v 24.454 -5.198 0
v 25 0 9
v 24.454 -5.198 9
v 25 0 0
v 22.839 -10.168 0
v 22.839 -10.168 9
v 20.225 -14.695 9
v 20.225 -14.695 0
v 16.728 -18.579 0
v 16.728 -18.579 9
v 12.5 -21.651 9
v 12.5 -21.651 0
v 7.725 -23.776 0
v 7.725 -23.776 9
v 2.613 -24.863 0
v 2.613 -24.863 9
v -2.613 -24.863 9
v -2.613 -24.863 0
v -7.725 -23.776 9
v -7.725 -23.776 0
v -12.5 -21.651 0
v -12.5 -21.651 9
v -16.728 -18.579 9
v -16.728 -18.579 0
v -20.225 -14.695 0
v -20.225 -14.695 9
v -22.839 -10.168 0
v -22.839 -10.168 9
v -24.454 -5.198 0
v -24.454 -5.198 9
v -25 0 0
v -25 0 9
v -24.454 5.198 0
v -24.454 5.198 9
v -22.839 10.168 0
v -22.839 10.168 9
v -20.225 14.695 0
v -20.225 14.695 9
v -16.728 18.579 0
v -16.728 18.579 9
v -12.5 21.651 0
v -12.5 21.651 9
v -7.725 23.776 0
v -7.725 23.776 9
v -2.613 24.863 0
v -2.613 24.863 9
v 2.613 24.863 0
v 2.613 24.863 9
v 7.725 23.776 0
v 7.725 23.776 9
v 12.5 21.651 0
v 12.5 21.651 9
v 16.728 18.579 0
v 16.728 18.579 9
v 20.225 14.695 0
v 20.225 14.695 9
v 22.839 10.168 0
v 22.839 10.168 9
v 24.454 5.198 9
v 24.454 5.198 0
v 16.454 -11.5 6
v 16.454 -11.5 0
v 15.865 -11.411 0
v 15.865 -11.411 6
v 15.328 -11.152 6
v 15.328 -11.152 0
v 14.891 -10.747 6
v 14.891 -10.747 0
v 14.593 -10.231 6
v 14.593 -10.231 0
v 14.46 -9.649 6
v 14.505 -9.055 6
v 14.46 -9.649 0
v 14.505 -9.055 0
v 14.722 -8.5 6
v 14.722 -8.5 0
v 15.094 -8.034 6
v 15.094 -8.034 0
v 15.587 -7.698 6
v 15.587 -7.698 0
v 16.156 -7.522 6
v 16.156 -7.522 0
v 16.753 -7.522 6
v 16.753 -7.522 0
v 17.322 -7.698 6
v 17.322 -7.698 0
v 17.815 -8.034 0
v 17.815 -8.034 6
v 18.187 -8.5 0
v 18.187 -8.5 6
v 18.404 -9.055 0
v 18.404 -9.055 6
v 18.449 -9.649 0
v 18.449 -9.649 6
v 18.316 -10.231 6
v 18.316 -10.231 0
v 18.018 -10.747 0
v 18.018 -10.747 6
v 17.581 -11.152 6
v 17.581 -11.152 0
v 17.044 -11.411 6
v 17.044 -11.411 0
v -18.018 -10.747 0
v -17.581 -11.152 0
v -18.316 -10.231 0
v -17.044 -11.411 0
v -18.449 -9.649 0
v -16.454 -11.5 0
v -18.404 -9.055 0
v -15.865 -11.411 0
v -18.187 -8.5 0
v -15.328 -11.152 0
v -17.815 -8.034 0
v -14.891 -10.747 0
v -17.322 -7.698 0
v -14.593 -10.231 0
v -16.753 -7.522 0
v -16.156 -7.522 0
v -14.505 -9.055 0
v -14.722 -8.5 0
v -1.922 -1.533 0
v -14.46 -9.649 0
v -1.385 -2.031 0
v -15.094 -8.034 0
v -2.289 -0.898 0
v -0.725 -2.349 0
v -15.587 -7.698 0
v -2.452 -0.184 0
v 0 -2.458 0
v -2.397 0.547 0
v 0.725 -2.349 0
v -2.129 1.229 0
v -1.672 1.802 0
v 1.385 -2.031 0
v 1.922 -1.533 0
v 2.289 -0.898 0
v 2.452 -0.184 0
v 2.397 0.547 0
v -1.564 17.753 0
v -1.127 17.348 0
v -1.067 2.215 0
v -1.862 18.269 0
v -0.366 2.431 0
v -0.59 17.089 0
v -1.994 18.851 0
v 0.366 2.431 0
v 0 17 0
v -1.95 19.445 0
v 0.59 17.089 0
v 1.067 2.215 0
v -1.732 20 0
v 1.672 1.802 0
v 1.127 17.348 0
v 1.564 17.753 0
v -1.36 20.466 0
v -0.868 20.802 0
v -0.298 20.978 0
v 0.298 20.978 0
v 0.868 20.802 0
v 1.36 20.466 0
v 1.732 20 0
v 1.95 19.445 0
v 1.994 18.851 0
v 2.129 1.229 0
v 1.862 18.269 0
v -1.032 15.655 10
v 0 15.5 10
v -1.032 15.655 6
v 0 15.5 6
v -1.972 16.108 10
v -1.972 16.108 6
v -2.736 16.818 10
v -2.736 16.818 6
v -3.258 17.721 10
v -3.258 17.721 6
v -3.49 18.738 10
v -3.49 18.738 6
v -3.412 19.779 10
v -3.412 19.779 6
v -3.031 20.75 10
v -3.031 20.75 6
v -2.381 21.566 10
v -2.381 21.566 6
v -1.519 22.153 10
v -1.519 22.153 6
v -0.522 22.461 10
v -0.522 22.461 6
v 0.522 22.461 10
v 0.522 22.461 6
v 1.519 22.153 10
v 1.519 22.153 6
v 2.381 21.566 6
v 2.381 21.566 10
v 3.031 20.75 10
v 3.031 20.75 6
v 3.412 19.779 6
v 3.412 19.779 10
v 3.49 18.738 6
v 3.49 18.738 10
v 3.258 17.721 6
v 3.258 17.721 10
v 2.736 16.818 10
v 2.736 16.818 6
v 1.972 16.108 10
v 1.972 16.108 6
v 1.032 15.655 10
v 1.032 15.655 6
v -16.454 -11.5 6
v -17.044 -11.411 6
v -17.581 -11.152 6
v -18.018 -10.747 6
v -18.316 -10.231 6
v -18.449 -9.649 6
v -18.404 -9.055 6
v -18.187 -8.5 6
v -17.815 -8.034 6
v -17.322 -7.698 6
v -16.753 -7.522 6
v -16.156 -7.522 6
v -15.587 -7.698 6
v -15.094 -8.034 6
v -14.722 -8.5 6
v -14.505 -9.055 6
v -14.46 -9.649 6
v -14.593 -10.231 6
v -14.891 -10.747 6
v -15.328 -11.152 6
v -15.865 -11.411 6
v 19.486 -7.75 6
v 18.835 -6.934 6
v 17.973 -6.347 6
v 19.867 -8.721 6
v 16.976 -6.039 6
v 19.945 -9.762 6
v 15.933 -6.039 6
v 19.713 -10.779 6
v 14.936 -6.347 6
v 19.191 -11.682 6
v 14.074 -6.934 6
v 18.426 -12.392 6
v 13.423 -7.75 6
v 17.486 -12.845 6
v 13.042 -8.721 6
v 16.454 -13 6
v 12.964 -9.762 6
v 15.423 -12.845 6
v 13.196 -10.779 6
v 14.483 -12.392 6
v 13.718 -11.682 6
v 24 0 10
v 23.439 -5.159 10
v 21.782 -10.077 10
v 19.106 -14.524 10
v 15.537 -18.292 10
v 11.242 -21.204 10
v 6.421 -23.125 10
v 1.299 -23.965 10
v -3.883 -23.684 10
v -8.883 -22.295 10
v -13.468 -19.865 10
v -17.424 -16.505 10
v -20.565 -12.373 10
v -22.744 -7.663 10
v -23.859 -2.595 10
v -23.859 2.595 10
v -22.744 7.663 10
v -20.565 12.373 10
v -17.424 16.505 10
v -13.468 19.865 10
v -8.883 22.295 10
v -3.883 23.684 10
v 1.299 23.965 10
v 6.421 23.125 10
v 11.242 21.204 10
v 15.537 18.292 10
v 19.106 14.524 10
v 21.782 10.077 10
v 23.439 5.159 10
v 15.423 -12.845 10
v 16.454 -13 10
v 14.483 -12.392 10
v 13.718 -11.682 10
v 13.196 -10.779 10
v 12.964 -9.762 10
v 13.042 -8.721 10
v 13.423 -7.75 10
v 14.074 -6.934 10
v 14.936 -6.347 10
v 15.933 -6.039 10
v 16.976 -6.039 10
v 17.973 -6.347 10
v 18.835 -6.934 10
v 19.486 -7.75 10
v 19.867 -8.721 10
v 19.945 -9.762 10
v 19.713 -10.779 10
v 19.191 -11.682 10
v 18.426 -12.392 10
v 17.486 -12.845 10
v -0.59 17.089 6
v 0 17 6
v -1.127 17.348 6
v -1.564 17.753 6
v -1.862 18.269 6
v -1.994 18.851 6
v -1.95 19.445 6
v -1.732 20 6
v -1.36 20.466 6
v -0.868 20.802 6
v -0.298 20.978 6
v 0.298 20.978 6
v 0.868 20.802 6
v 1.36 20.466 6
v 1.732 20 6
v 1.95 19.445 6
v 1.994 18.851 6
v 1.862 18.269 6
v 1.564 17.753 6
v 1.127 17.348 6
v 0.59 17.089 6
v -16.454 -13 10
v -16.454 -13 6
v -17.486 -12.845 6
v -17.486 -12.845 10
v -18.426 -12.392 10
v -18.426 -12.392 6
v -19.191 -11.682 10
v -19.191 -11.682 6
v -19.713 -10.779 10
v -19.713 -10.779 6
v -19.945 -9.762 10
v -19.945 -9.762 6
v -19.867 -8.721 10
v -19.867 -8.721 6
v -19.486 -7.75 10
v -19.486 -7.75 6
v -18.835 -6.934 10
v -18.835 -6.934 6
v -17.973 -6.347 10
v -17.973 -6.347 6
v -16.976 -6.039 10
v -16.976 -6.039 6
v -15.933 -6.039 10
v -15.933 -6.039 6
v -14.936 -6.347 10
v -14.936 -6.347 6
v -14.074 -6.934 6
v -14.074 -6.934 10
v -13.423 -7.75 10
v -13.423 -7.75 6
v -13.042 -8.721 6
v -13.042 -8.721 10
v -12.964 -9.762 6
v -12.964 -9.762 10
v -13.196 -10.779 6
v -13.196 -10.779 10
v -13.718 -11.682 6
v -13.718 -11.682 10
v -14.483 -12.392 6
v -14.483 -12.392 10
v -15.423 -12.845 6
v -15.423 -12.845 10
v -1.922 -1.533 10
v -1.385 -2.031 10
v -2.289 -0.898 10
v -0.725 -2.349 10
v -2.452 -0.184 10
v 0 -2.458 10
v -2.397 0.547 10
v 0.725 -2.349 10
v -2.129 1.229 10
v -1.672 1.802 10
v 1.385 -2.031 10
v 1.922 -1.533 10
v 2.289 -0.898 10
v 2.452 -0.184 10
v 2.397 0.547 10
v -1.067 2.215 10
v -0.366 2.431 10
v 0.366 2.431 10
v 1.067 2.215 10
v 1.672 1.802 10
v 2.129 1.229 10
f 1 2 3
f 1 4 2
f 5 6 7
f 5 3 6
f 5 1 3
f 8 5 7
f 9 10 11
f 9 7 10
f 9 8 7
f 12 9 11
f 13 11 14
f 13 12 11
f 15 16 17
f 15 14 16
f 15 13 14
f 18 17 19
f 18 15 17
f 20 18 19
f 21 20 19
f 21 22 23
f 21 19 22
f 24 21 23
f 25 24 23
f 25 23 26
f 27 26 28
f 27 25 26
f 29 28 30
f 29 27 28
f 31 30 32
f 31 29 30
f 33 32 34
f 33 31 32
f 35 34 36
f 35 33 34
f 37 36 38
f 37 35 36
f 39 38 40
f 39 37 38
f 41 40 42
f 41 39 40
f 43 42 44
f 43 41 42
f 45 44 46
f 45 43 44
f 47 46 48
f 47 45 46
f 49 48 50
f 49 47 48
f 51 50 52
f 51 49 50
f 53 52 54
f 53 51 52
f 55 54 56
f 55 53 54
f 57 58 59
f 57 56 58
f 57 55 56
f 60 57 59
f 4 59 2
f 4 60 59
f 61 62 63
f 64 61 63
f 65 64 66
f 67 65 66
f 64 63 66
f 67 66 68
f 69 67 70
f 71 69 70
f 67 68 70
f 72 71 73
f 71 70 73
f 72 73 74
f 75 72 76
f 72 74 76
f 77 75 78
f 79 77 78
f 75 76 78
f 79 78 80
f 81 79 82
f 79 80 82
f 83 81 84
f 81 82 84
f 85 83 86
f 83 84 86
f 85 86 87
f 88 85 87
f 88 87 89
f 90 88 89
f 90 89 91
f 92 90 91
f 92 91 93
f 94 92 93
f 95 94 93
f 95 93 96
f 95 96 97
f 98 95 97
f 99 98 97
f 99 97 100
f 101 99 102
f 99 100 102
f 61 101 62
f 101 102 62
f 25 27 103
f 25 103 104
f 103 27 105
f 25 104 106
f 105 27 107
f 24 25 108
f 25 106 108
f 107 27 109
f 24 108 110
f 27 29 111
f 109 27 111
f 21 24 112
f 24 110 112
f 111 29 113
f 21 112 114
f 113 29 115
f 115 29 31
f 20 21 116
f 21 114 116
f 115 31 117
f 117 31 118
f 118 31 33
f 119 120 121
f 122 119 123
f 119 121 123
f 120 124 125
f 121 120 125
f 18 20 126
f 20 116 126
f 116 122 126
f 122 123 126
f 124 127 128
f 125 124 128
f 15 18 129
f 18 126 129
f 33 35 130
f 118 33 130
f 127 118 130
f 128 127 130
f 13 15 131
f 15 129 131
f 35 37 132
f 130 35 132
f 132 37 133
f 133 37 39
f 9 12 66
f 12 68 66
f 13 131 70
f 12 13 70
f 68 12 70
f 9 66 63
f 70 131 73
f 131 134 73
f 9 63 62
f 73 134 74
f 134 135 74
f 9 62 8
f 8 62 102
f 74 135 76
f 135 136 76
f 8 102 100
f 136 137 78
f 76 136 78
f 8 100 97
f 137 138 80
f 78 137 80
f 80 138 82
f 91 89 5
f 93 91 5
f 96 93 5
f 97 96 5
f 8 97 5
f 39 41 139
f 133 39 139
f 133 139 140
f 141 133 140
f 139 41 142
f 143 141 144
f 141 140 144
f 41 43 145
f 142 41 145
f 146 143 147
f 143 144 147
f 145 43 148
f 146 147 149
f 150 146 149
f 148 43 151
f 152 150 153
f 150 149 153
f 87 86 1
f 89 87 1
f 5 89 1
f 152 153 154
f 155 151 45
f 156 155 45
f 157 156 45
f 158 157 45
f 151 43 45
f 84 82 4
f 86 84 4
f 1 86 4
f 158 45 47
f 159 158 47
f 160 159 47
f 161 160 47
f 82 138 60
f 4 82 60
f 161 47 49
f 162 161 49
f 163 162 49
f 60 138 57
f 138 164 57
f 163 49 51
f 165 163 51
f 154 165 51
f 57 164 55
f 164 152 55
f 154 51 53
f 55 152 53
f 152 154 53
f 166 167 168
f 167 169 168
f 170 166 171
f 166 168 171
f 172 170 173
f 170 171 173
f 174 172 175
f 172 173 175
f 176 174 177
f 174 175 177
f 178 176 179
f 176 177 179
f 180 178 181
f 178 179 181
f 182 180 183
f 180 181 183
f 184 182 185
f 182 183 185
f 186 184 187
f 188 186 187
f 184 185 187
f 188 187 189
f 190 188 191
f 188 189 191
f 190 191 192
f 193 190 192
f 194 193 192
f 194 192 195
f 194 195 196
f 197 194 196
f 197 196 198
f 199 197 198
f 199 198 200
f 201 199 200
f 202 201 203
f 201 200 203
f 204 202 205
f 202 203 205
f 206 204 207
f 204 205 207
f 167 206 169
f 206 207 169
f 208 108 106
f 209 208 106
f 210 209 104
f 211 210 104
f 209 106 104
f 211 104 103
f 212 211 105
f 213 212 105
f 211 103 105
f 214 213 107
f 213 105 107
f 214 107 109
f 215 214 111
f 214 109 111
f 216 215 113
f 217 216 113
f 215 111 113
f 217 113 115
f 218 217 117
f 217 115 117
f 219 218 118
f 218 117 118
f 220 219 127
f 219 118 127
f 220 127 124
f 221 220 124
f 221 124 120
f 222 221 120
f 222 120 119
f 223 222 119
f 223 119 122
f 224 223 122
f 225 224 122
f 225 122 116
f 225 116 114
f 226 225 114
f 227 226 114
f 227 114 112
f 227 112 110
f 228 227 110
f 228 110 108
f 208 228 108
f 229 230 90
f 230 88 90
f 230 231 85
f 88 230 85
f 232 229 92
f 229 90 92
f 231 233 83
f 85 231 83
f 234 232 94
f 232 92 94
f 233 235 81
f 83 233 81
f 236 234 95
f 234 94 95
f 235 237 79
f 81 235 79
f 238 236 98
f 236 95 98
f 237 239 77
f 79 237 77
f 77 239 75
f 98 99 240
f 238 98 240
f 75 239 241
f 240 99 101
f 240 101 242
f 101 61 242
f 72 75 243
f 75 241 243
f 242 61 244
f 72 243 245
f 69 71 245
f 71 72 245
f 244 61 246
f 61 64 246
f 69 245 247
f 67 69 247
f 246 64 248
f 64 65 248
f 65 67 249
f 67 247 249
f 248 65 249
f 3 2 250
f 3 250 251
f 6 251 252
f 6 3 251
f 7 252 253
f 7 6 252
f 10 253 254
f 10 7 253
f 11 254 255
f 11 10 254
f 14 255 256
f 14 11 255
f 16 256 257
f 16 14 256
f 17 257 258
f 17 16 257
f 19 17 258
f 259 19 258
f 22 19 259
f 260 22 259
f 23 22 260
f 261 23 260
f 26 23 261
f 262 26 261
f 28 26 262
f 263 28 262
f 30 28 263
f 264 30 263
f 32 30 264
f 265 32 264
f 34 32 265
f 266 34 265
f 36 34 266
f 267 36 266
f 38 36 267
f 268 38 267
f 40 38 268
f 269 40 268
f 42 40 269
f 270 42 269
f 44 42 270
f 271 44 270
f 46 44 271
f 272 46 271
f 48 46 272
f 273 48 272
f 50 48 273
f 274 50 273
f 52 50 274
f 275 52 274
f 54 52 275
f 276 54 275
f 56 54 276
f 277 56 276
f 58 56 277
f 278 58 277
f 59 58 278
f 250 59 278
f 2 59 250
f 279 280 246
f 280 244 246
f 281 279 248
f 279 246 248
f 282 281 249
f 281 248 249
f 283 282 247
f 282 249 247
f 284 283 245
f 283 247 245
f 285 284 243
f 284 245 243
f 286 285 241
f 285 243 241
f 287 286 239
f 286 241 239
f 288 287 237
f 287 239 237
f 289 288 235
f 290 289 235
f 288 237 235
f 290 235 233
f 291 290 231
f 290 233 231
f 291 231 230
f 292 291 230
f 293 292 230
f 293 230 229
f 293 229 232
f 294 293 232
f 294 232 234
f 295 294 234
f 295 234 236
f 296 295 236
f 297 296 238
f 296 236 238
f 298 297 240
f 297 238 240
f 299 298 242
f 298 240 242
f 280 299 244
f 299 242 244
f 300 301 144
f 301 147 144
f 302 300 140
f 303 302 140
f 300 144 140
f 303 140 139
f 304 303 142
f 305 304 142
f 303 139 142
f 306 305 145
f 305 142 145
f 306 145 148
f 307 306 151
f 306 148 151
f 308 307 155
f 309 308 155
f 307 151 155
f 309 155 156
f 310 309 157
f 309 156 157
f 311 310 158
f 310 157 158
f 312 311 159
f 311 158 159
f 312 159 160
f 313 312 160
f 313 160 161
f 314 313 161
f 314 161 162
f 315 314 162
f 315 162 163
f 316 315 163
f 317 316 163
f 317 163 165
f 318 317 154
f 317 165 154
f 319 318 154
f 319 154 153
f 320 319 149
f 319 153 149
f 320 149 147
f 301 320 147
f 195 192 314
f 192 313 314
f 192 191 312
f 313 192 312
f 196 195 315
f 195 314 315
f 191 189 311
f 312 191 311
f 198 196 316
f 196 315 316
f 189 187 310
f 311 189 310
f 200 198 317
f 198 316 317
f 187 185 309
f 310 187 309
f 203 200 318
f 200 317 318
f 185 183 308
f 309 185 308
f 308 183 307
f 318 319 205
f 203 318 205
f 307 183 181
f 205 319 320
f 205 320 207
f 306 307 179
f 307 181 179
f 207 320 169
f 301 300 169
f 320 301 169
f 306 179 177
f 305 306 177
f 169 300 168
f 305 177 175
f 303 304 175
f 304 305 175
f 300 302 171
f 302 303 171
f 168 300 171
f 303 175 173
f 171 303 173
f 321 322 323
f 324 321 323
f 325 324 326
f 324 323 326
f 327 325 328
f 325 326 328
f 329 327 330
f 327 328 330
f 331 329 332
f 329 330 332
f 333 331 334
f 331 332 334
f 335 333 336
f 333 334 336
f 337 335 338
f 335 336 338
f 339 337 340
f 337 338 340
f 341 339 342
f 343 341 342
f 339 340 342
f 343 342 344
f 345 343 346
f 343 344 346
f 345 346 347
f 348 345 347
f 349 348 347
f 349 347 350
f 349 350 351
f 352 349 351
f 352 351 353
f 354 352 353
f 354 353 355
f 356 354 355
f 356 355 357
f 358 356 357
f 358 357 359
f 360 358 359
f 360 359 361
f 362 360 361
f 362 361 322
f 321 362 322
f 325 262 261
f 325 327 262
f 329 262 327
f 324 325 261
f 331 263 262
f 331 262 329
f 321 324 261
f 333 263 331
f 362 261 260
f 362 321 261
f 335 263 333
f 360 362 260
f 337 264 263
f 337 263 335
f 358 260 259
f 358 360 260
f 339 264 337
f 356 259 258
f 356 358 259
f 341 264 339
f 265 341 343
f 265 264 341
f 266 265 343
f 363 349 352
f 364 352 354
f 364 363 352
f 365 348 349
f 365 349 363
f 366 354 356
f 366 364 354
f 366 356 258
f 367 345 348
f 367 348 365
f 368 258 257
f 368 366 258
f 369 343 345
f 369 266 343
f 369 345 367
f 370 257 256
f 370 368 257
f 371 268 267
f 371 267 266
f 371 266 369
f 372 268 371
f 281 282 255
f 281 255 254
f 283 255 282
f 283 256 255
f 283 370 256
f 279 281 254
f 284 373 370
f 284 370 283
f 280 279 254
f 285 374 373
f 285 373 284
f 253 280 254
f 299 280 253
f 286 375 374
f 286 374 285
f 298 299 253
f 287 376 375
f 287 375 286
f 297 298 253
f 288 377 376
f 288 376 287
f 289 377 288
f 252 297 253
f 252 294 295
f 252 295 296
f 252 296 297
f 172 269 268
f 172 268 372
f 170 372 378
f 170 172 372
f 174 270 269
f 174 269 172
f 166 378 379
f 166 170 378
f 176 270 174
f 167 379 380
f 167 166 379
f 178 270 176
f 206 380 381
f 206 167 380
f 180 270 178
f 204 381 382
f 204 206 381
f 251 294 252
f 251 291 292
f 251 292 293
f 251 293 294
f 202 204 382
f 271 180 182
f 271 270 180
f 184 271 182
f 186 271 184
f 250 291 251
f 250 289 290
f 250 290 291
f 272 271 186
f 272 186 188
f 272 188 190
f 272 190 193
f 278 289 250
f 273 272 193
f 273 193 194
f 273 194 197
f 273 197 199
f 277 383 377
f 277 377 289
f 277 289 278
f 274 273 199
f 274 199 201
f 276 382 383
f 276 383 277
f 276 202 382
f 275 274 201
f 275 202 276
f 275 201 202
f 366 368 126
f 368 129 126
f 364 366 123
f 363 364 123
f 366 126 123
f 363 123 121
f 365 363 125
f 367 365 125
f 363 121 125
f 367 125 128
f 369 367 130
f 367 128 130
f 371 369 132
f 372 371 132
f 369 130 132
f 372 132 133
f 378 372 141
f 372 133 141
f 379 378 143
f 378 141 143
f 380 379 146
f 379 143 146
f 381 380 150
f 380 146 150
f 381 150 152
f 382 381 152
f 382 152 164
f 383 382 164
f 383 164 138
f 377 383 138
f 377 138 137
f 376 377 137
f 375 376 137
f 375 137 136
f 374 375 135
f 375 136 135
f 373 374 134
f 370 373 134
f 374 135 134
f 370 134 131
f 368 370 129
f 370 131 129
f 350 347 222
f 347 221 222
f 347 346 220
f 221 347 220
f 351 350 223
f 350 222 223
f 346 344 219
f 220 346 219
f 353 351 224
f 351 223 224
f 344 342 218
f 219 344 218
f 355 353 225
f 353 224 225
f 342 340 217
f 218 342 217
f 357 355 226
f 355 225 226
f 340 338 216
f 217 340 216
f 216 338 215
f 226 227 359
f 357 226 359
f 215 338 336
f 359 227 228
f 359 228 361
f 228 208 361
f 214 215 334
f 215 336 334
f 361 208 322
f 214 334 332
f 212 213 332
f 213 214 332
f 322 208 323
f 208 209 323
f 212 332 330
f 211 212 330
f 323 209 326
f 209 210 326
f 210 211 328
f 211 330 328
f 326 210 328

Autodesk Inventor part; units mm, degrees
ref_plane "YZ Plane" through (0, 0, 0) normal (1, 0, 0) x (0, 1, 0)
ref_plane "XZ Plane" through (0, 0, 0) normal (0, 1, 0) x (-1, 0, 0)
ref_plane "XY Plane" through (0, 0, 0) normal (0, 0, 1) x (1, 0, 0)
sketch "Sketch1" plane through (0, 0, 0) normal (0, 0, 1) x (1, 0, 0)
  line L0 (0, 35) -> (0, -35) construction
  line L1 (-35, 0) -> (35, 0) construction
  circle A0 centre (0, 0) radius 25
  dimension "d0" = 50
extrude "Extrusion1" add sketch "Sketch1" along normal blind 10
sketch "Sketch2" plane through (0, 0, 10) normal (0, 0, 1) x (1, 0, 0)
  point P0 (0, 0)
  point P1 (0, 0)
hole "Hole1" at (0, 0, 10) direction (0, 0, -1) diameter 4.917 end through all thread size "M6x1" class "6H" standard "ISO Metric profile"
sketch "Sketch3" plane through (0, 0, 10) normal (0, 0, 1) x (1, 0, 0)
  circle A0 centre (0, 0) radius 19 construction
  line L0 (0, 35) -> (0, -35) construction
  point P0 (0, 19)
  point P1 (-16.4545, -9.5)
  point P2 (16.4545, -9.5)
  dimension "d10" = 38
  dimension "d11" = 120
  dimension "d12" = 120
hole "Hole2" at (0, 19, 10) at (-16.4545, -9.5, 10) at (16.4545, -9.5, 10) direction (0, 0, -1) diameter 4 end through all counterbore diameter 7 counterbore depth 4
chamfer "Chamfer1" distance 1 angle 45 1 edges at (-25, 0, 10)
properties part number "M-060-Adapter"
